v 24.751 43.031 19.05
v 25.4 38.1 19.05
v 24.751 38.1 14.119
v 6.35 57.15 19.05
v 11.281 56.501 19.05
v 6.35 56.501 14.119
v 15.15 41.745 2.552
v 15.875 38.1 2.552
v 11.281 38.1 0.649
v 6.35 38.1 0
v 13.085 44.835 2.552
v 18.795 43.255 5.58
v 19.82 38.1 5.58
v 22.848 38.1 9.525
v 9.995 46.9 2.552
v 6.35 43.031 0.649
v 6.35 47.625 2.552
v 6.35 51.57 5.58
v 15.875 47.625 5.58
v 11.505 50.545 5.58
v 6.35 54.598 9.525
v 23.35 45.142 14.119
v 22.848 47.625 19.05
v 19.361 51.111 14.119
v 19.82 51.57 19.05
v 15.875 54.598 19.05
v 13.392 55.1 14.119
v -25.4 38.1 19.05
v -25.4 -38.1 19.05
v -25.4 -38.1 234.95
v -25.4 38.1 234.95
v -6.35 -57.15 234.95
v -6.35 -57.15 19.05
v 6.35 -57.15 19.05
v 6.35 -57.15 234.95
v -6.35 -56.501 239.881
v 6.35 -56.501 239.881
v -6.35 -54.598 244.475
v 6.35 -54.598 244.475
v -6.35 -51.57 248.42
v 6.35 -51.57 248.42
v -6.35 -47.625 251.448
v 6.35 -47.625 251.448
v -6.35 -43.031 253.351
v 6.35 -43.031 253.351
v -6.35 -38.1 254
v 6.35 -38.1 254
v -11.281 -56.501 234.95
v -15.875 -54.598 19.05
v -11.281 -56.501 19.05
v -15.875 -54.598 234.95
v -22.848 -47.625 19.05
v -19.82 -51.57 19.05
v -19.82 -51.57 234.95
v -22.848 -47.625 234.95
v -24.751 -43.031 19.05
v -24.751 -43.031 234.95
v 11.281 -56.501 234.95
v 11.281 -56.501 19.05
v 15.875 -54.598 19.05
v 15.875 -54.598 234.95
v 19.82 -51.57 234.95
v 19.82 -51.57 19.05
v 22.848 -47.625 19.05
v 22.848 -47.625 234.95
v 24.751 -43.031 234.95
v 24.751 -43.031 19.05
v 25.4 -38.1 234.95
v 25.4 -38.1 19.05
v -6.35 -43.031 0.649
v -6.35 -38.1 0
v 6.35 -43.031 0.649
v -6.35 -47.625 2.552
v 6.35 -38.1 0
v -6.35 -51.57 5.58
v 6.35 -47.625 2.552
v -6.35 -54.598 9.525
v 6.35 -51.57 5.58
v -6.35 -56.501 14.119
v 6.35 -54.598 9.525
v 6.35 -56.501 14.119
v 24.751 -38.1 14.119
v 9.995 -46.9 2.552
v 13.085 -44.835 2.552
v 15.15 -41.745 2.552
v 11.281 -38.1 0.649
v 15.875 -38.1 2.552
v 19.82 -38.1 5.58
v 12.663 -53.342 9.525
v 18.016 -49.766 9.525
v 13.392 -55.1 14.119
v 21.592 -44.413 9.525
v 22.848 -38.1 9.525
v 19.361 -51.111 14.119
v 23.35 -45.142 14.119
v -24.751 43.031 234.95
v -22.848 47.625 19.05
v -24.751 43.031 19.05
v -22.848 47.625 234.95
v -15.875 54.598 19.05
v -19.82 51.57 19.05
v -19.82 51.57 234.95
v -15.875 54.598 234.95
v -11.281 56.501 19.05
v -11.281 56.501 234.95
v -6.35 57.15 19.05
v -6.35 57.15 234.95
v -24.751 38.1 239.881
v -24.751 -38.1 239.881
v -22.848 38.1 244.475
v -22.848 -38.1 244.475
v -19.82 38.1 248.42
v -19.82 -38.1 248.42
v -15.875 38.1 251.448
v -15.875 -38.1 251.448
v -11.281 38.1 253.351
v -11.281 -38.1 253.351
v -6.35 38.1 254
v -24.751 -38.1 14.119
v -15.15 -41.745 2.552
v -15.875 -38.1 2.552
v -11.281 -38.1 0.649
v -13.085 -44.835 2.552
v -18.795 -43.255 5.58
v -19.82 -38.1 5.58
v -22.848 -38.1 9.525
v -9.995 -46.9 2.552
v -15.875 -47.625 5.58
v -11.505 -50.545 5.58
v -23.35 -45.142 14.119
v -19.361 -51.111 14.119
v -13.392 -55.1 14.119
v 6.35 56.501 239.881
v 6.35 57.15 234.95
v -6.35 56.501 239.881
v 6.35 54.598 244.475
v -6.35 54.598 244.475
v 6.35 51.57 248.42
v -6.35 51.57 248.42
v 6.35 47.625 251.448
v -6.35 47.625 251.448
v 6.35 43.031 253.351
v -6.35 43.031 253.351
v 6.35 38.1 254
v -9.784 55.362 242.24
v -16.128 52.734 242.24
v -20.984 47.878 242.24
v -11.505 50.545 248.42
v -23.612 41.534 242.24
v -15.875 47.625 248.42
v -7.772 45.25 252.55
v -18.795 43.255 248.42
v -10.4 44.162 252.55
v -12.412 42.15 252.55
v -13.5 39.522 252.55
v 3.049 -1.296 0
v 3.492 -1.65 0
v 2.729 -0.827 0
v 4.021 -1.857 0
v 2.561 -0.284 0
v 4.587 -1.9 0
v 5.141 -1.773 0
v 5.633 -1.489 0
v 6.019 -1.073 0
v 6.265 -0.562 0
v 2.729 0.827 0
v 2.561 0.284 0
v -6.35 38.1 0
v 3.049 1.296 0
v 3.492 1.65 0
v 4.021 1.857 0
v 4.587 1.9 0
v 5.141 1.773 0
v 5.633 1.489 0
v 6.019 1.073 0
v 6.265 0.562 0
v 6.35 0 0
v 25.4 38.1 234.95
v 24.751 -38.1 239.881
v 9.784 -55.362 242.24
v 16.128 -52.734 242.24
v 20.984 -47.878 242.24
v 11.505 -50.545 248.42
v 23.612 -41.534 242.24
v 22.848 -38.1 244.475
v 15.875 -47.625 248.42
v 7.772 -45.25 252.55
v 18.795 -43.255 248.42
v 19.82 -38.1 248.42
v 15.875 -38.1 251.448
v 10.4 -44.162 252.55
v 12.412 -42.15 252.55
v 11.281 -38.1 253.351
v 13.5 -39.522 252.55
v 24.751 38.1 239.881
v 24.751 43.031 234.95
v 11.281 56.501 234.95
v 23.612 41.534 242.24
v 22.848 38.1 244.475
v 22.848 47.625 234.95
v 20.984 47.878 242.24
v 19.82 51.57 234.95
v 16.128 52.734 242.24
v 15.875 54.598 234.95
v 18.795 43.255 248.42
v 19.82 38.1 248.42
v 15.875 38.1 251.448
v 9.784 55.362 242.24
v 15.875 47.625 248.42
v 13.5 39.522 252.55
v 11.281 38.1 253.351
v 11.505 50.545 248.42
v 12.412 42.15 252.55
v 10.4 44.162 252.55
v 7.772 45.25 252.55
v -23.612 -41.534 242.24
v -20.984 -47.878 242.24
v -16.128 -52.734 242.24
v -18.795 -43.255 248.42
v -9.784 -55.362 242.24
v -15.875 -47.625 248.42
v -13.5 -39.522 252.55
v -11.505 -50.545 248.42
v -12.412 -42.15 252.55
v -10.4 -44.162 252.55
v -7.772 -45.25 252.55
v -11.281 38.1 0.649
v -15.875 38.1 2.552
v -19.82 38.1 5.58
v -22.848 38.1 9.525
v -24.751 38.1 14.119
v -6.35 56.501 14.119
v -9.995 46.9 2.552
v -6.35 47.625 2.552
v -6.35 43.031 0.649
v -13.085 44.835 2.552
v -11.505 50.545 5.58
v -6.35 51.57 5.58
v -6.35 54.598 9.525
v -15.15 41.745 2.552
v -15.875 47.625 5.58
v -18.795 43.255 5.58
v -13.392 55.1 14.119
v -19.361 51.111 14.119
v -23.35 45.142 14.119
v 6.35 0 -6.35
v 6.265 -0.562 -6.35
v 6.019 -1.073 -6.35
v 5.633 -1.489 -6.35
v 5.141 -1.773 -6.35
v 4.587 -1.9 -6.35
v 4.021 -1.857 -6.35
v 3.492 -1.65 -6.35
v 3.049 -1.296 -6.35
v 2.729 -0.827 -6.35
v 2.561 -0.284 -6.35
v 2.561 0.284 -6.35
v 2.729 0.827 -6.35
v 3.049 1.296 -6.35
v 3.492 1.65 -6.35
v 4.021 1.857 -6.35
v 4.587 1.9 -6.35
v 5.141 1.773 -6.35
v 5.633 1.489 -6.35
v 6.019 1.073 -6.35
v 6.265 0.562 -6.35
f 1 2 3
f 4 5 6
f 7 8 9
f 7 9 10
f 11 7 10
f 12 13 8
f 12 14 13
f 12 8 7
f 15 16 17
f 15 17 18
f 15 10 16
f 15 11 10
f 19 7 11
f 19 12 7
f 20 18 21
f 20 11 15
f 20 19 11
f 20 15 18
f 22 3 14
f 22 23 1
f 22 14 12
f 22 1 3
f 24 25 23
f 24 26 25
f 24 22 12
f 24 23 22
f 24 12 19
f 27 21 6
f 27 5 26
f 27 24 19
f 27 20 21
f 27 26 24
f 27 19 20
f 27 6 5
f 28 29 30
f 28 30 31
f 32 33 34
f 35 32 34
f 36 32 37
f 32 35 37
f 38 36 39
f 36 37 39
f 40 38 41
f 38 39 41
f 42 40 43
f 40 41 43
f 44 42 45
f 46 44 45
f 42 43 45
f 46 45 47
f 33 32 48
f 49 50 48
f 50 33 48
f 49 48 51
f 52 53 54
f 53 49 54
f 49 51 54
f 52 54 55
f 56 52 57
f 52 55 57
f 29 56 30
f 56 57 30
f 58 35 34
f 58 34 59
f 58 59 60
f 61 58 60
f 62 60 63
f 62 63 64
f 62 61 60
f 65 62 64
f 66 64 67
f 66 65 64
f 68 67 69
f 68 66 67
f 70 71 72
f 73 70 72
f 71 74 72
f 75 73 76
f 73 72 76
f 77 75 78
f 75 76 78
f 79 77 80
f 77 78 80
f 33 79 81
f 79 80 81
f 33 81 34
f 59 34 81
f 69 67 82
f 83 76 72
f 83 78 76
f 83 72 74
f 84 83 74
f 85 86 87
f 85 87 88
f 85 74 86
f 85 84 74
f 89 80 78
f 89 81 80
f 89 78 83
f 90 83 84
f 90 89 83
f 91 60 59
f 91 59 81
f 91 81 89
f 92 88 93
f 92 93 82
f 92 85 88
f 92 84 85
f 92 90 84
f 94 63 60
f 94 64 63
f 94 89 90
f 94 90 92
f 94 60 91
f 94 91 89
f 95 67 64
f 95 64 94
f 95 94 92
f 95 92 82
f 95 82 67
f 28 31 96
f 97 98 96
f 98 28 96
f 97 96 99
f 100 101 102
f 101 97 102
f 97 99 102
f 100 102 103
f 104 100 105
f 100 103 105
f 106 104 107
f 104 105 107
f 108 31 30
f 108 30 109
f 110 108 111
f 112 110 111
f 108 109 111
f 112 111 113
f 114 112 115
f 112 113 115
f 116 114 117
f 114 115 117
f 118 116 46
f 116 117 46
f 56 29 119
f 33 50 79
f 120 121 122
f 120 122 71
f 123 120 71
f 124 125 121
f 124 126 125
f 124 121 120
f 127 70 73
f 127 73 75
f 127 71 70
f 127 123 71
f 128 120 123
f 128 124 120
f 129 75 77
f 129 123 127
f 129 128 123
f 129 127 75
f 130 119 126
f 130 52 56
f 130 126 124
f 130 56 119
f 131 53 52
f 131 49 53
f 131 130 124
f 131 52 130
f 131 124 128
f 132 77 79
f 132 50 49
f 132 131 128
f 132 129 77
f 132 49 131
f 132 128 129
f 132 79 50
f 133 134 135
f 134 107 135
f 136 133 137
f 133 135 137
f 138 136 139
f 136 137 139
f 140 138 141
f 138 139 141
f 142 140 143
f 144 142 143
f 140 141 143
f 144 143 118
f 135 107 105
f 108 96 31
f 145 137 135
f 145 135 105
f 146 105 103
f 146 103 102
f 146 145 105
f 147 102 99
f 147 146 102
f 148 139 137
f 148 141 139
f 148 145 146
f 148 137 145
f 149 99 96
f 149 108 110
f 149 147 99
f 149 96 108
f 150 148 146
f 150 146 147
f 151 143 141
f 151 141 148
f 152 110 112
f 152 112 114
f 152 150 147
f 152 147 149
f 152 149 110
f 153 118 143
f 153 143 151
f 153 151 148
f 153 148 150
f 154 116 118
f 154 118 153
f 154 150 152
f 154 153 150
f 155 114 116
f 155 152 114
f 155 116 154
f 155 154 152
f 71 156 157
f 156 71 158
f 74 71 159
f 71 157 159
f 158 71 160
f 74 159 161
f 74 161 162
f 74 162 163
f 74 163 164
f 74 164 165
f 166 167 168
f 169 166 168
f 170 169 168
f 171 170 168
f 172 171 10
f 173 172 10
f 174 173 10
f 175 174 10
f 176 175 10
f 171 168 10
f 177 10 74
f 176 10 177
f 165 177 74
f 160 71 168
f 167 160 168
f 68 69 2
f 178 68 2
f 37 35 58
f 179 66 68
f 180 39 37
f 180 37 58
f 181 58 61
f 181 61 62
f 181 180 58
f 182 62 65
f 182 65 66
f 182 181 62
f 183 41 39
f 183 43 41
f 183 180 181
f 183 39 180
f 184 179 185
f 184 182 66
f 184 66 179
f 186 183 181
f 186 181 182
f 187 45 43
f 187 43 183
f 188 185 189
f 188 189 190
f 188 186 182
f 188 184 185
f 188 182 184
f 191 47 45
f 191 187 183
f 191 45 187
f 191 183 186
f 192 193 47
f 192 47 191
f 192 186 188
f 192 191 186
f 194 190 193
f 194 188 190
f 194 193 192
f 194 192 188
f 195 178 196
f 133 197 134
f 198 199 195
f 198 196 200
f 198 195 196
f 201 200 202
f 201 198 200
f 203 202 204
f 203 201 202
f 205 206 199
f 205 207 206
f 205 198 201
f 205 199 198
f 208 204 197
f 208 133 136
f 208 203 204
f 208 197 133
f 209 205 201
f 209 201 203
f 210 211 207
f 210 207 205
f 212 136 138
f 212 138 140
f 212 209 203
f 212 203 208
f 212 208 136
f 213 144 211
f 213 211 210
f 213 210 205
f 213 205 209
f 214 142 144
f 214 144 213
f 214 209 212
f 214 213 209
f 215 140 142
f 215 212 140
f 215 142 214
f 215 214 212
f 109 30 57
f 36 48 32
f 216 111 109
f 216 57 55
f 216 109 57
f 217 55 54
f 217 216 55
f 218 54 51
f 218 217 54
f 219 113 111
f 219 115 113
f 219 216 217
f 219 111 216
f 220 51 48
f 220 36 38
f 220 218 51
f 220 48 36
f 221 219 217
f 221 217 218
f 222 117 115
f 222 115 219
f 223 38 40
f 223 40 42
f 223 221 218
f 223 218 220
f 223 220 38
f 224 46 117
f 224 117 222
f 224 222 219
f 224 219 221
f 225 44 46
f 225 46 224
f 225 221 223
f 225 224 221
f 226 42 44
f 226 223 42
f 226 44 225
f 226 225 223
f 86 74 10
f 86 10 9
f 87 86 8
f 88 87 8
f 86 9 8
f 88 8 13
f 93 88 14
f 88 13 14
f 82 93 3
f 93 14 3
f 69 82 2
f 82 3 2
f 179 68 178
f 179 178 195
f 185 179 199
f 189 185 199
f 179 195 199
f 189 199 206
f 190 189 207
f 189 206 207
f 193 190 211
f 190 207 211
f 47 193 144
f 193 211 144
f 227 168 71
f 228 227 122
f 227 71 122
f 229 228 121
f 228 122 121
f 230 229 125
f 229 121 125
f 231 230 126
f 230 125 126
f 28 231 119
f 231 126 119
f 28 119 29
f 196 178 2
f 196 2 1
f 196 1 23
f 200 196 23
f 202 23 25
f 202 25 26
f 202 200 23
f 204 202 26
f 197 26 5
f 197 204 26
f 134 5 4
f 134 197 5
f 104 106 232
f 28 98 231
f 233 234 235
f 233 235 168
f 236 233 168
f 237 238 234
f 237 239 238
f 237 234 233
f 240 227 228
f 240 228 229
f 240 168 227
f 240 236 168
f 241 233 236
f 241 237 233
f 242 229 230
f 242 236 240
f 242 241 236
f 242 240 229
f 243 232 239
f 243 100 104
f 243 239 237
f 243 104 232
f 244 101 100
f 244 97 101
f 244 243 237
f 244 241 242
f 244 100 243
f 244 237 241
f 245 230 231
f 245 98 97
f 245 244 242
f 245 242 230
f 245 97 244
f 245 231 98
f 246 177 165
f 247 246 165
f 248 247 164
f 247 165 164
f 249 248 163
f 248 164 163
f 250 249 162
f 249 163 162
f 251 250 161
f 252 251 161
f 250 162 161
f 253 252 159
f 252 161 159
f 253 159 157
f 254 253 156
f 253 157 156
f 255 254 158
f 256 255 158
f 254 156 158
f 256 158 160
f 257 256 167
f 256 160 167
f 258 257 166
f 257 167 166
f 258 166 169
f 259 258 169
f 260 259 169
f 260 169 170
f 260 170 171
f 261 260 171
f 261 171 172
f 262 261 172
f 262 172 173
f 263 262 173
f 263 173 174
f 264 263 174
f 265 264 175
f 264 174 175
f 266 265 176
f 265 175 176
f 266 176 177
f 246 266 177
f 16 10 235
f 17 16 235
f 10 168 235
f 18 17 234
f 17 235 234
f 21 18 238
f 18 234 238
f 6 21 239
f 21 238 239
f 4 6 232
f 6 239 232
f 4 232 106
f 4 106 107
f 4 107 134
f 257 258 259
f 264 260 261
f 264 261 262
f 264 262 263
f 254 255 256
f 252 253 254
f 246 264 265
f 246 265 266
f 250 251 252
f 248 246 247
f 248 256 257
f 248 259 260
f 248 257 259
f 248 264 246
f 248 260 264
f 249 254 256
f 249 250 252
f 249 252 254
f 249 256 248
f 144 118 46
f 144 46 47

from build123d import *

# Parameters (mm, degrees)
F0_W     = 50.8
F0_H     = 114.3
F1_DEPTH = 254
F2_R     = 1.905
F3_DEPTH = 6.35
F4_F1_R  = 19.05
F4_F2_R  = 19.05
F4_F3_R  = 19.05
F4_F4_R  = 19.05
F4_F5_R  = 19.0499
F4_F6_R  = 19.05


# Not quite as in the source:
# - a fillet or chamfer is up to 0.001 mm smaller than in the source, because OpenCascade refuses the exact size


with BuildPart() as f1:
    # F0 (on Top) → F1 (new body)
    with BuildSketch(Plane.XY):
        Rectangle(F0_W, F0_H)
    extrude(amount=F1_DEPTH)

    # F2 (on face) → F3 (join)
    with BuildSketch(Plane(origin=(0, 0, 0), x_dir=(1, 0, 0), z_dir=(0, 0, -1))):
        with Locations((4.445, 0)):
            Circle(F2_R)
    extrude(amount=F3_DEPTH)

    # F4: fillet of radius 19.05 on 12 edges, made by hand

    # F4_f1
    f4_f1_edges = [f1.edges().sort_by_distance(p)[0] for p in [
        (25.4, -57.15, 127),
    ]]
    fillet(f4_f1_edges, radius=F4_F1_R)

    # F4_f2
    f4_f2_edges = [f1.edges().sort_by_distance(p)[0] for p in [
        (25.4, 57.15, 127),
    ]]
    fillet(f4_f2_edges, radius=F4_F2_R)

    # F4_f3
    f4_f3_edges = [f1.edges().sort_by_distance(p)[0] for p in [
        (-25.4, -57.15, 127),
    ]]
    fillet(f4_f3_edges, radius=F4_F3_R)

    # F4_f4
    f4_f4_edges = [f1.edges().sort_by_distance(p)[0] for p in [
        (-25.4, 57.15, 127),
    ]]
    fillet(f4_f4_edges, radius=F4_F4_R)

    # F4_f5 (radius 19.05 in the source; OpenCascade refuses exactly that, so slightly less here)
    f4_f5_edges = [f1.edges().sort_by_distance(p)[0] for p in [
        (25.4, 0, 0),
    ]]
    fillet(f4_f5_edges, radius=F4_F5_R)

    # F4_f6
    f4_f6_edges = [f1.edges().sort_by_distance(p)[0] for p in [
        (25.4, 0, 254),
    ]]
    fillet(f4_f6_edges, radius=F4_F6_R)


solid = f1.part
